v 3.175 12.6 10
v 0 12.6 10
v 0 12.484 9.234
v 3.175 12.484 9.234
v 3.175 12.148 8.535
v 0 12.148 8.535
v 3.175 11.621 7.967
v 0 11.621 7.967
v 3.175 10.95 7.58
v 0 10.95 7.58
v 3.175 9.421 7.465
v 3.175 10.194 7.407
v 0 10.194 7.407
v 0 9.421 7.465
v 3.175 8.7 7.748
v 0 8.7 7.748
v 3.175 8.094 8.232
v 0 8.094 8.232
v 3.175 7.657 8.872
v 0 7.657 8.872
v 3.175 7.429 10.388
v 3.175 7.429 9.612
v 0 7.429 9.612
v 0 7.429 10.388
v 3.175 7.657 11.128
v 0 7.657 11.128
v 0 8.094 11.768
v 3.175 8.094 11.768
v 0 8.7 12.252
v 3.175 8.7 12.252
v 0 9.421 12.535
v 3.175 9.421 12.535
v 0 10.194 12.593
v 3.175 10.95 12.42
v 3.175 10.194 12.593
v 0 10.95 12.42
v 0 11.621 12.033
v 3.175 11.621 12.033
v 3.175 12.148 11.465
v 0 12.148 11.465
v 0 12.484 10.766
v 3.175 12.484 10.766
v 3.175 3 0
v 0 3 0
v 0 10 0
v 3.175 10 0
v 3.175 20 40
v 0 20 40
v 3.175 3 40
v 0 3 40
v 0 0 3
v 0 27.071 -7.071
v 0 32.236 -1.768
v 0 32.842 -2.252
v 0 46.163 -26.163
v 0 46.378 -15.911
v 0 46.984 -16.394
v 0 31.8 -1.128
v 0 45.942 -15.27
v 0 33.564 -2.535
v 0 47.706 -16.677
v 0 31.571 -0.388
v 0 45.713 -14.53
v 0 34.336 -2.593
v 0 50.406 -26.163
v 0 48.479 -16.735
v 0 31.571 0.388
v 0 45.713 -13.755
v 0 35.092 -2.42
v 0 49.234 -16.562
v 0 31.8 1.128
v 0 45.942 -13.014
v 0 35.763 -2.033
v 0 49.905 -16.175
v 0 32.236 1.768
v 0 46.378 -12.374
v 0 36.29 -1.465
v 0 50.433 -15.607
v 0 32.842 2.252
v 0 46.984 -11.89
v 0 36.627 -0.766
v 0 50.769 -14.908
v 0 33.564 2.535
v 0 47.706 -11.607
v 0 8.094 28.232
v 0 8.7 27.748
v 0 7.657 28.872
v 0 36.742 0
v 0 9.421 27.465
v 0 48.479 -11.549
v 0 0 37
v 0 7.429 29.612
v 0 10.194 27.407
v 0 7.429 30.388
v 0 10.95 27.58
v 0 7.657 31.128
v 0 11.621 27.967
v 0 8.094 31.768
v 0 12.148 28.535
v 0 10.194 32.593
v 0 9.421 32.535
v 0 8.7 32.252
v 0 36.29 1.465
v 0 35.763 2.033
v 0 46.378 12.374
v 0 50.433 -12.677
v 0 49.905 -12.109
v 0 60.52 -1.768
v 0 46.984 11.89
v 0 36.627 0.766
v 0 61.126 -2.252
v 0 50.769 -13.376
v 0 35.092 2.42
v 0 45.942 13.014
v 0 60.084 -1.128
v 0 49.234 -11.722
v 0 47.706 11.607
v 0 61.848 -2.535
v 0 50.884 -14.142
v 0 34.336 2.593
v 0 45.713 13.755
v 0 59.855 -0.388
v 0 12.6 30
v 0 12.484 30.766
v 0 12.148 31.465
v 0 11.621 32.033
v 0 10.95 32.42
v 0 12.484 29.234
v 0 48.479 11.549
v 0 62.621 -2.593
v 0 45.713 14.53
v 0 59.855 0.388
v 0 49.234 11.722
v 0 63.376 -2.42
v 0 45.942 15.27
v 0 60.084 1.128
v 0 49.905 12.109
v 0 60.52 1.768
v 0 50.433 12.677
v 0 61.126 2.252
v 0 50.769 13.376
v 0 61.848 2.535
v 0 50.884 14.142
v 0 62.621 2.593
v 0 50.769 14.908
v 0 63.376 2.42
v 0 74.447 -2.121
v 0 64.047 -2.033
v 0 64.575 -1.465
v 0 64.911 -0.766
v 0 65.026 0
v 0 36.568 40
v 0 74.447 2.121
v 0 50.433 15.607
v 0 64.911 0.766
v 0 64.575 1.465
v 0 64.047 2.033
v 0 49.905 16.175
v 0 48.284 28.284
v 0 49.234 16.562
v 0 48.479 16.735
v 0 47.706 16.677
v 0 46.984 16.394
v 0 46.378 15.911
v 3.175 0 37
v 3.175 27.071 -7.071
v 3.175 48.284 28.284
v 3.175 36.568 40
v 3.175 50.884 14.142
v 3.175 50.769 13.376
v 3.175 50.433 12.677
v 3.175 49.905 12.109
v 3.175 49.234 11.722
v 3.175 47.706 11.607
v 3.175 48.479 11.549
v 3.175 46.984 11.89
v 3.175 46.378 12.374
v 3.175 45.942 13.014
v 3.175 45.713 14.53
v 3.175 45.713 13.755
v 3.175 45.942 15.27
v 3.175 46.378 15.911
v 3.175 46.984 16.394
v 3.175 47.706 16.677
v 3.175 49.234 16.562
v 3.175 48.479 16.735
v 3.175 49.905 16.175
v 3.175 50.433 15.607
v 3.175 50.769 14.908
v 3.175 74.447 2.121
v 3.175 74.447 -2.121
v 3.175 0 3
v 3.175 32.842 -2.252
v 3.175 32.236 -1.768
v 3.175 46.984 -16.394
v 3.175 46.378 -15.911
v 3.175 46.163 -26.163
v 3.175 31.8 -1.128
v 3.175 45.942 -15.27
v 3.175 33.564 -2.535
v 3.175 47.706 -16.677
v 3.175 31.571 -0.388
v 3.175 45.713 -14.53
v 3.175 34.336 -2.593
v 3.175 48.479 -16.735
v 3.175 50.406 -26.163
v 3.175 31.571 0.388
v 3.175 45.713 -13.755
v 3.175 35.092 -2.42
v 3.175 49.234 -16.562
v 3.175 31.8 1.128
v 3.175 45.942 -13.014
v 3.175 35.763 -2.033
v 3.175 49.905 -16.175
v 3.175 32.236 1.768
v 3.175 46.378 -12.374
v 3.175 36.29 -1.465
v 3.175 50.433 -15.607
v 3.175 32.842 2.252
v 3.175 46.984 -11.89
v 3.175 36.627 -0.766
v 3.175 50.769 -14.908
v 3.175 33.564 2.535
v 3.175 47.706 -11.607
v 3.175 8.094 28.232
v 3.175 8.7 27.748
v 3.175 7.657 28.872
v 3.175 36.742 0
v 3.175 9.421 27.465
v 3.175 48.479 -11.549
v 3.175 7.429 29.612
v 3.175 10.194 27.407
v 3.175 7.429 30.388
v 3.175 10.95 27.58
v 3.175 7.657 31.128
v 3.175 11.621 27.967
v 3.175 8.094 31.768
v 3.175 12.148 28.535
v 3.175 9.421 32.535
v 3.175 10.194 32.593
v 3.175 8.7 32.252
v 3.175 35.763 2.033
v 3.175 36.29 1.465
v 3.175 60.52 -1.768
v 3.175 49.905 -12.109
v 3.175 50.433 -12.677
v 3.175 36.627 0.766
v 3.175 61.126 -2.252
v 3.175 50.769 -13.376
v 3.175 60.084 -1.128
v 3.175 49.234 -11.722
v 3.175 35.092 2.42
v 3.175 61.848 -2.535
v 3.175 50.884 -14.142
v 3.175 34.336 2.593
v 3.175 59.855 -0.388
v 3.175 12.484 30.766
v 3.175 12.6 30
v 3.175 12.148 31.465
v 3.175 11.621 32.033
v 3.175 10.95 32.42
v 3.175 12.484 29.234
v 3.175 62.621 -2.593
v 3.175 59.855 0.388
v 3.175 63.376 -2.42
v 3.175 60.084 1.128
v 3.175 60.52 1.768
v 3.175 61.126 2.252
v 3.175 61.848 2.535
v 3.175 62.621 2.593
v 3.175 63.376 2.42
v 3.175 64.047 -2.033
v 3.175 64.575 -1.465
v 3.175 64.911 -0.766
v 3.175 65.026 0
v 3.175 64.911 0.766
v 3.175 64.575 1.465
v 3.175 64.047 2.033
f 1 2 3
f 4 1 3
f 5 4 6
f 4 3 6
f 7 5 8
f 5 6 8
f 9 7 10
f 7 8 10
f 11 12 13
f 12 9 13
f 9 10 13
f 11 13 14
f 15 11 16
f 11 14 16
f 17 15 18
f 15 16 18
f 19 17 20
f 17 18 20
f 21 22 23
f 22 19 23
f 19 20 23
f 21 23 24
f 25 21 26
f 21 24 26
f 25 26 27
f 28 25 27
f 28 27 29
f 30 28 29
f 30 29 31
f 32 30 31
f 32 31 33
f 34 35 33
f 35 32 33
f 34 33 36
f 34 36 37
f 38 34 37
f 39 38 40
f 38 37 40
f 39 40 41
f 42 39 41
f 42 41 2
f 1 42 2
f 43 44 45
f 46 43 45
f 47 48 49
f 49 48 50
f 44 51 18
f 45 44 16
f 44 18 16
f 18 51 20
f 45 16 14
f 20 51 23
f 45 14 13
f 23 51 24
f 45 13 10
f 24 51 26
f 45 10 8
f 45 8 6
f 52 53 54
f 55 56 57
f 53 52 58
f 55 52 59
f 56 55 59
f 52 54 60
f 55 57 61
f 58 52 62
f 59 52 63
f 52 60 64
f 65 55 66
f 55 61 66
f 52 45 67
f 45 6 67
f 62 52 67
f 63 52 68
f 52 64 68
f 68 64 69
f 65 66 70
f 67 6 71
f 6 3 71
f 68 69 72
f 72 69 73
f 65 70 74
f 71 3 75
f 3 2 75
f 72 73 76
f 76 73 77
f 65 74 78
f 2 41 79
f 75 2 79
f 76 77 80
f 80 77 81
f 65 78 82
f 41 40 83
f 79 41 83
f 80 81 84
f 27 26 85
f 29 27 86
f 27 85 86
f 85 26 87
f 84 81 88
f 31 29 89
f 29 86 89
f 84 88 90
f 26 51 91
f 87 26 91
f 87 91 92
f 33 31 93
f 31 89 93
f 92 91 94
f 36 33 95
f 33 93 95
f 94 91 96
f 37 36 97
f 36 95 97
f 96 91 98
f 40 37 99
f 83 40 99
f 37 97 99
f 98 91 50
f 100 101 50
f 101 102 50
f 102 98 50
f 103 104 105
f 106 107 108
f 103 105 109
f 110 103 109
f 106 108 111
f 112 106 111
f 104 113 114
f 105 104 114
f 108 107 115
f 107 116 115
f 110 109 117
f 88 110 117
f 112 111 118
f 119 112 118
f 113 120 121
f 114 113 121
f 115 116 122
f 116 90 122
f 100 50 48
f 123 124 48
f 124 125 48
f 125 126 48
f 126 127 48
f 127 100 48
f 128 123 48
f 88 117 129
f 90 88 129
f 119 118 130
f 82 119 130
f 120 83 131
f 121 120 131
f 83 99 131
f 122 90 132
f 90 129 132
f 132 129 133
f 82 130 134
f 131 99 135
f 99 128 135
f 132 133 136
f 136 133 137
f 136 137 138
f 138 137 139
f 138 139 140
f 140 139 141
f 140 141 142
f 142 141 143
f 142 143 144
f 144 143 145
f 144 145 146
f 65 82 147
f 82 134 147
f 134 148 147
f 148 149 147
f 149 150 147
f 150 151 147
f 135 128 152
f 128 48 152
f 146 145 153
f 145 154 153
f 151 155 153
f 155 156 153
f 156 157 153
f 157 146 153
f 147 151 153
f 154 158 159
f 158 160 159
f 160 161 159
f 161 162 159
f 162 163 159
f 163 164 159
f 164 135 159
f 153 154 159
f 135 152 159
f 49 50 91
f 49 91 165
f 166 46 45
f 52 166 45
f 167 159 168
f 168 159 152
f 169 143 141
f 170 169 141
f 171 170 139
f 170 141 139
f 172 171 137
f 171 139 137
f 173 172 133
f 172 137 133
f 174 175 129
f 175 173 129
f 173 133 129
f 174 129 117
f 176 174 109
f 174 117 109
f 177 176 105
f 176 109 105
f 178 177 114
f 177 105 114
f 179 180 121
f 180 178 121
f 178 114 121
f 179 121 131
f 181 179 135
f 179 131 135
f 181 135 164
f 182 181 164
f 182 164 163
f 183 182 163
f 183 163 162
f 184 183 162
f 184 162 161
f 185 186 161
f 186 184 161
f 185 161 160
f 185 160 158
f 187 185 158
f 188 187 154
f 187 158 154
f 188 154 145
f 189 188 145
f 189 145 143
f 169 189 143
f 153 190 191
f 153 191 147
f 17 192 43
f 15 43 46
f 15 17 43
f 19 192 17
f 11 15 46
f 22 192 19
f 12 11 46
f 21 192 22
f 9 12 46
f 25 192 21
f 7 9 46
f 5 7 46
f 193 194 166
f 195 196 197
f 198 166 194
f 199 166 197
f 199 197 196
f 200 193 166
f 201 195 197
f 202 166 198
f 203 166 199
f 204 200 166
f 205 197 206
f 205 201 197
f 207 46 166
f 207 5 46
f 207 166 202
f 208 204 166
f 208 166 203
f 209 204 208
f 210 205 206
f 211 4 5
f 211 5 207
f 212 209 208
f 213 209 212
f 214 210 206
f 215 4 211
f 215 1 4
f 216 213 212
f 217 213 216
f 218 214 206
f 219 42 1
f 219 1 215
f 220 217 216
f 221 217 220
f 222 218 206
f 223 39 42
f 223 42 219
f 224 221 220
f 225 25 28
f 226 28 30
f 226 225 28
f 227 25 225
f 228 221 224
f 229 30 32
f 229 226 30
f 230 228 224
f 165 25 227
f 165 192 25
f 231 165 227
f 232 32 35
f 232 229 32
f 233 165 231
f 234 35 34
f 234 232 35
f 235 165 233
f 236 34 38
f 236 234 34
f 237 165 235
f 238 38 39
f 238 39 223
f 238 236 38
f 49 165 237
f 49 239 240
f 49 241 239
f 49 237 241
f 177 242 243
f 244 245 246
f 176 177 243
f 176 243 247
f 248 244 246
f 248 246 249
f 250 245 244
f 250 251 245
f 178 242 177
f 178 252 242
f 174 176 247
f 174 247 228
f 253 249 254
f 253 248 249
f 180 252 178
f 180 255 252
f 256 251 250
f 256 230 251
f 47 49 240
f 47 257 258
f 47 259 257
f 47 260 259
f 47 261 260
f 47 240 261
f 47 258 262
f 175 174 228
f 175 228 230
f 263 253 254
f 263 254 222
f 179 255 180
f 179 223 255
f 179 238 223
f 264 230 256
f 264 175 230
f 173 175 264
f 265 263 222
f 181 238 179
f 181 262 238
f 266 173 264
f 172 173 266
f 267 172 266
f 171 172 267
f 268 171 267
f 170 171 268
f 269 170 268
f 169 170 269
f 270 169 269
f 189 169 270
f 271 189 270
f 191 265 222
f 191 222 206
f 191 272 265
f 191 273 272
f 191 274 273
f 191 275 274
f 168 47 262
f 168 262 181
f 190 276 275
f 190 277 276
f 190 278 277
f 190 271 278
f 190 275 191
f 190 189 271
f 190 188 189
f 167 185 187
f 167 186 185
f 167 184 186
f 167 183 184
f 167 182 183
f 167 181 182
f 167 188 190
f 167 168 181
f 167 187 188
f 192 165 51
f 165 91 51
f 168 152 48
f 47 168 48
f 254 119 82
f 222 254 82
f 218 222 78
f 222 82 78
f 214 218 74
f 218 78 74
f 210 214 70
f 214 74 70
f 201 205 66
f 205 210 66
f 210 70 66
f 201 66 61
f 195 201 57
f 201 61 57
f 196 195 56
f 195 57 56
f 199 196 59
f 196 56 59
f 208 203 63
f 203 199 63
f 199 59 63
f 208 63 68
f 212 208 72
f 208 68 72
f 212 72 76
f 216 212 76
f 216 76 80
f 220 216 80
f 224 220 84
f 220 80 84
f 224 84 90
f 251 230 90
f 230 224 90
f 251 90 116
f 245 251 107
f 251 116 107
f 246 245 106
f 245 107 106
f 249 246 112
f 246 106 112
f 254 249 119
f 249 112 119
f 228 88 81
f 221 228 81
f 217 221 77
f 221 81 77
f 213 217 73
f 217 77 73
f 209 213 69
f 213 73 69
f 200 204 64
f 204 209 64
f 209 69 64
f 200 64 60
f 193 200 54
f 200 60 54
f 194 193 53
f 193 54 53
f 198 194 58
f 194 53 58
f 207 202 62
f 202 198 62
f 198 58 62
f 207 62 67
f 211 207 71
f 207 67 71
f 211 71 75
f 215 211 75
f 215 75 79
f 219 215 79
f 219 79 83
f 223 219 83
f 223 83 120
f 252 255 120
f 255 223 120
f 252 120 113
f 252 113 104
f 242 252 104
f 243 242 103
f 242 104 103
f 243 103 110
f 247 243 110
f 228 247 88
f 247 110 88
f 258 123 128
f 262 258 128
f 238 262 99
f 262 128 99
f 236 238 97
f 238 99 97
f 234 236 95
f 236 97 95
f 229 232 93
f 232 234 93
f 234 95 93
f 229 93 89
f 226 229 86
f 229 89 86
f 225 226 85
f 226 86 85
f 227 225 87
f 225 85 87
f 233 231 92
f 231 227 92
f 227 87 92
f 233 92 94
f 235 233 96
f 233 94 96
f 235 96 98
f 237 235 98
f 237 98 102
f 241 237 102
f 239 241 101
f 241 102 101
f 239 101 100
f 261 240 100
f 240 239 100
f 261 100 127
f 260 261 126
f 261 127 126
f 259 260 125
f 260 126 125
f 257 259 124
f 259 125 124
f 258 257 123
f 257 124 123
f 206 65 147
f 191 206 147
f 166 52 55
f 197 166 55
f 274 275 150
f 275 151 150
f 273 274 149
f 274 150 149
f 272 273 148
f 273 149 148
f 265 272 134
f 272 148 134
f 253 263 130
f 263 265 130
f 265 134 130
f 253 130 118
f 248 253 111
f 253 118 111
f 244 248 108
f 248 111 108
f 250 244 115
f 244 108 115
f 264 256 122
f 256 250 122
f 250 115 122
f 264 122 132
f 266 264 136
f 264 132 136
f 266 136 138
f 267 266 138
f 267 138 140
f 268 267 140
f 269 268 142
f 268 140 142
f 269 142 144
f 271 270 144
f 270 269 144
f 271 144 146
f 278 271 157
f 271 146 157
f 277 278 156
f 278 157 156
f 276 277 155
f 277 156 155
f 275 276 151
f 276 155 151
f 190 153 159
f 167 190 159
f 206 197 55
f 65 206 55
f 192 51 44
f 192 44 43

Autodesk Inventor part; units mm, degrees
ref_plane "YZ Plane" through (0, 0, 0) normal (1, 0, 0) x (0, 1, 0)
ref_plane "XZ Plane" through (0, 0, 0) normal (0, 1, 0) x (-1, 0, 0)
ref_plane "XY Plane" through (0, 0, 0) normal (0, 0, 1) x (1, 0, 0)
sketch "Sketch1" plane through (0, 0, 0) normal (1, 0, 0) x (0, 1, 0)
  line L0 (0, 0) -> (20, 0)
  line L1 (20, 0) -> (20, 40) construction
  line L2 (20, 40) -> (0, 40)
  line L3 (0, 40) -> (0, 0)
  line L4 (20, 0) -> (65, 0) construction
  line L5 (48.2843, 28.2843) -> (36.5685, 40)
  line L6 (36.5685, 40) -> (20, 40)
  line L7 (48.2843, 28.2843) -> (20, 0) construction
  line L8 (20, 0) -> (48.2843, -28.2843)
  line L9 (48.2843, -28.2843) -> (76.5685, 0)
  line L10 (76.5685, 0) -> (48.2843, 28.2843)
  line L11 (10, 40) -> (10, 0) construction
  circle A0 centre (10, 30) radius 2.6
  circle A1 centre (10, 10) radius 2.6
  line L12 (48.2843, 14.1421) -> (34.1421, 0) construction
  line L13 (34.1421, 0) -> (48.2843, -14.1421) construction
  line L14 (48.2843, -14.1421) -> (62.4264, 0) construction
  line L15 (62.4264, 0) -> (48.2843, 14.1421) construction
  circle A2 centre (62.4264, 0) radius 2.6
  circle A3 centre (48.2843, 14.1421) radius 2.6
  circle A4 centre (34.1421, 0) radius 2.6
  circle A5 centre (48.2843, -14.1421) radius 2.6
  dimension "d0" = 20
  dimension "d1" = 40
  dimension "d2" = 40
  dimension "d4" = 40
  dimension "d5" = 45
  dimension "d6" = 5.2
  dimension "d7" = 5.2
  dimension "d8" = 10
  dimension "d9" = 10
  dimension "d10" = 20
  dimension "d11" = 20
  dimension "d12" = 10
  dimension "d13" = 10
  dimension "d14" = 5.2
  dimension "d15" = 5.2
  dimension "d16" = 5.2
  dimension "d17" = 5.2
extrude "Extrusion1" add sketch "Sketch1" along normal blind 3.175
chamfer "Chamfer1" distance 10 angle 45 1 edges at (1.5875, 20, 0)
chamfer "Chamfer2" distance 3 angle 45 4 edges at (1.5875, 48.2843, -28.2843) (1.5875, 76.5685, 0) (1.5875, 0, 0) (1.5875, 0, 40)
equation "\"d7\" = d6"
equation "\"d14\" = d6"
equation "\"d15\" = d6"
equation "\"d16\" = d6"
equation "\"d17\" = d6"
properties part number "45deg 2040 Connector Bracket"
